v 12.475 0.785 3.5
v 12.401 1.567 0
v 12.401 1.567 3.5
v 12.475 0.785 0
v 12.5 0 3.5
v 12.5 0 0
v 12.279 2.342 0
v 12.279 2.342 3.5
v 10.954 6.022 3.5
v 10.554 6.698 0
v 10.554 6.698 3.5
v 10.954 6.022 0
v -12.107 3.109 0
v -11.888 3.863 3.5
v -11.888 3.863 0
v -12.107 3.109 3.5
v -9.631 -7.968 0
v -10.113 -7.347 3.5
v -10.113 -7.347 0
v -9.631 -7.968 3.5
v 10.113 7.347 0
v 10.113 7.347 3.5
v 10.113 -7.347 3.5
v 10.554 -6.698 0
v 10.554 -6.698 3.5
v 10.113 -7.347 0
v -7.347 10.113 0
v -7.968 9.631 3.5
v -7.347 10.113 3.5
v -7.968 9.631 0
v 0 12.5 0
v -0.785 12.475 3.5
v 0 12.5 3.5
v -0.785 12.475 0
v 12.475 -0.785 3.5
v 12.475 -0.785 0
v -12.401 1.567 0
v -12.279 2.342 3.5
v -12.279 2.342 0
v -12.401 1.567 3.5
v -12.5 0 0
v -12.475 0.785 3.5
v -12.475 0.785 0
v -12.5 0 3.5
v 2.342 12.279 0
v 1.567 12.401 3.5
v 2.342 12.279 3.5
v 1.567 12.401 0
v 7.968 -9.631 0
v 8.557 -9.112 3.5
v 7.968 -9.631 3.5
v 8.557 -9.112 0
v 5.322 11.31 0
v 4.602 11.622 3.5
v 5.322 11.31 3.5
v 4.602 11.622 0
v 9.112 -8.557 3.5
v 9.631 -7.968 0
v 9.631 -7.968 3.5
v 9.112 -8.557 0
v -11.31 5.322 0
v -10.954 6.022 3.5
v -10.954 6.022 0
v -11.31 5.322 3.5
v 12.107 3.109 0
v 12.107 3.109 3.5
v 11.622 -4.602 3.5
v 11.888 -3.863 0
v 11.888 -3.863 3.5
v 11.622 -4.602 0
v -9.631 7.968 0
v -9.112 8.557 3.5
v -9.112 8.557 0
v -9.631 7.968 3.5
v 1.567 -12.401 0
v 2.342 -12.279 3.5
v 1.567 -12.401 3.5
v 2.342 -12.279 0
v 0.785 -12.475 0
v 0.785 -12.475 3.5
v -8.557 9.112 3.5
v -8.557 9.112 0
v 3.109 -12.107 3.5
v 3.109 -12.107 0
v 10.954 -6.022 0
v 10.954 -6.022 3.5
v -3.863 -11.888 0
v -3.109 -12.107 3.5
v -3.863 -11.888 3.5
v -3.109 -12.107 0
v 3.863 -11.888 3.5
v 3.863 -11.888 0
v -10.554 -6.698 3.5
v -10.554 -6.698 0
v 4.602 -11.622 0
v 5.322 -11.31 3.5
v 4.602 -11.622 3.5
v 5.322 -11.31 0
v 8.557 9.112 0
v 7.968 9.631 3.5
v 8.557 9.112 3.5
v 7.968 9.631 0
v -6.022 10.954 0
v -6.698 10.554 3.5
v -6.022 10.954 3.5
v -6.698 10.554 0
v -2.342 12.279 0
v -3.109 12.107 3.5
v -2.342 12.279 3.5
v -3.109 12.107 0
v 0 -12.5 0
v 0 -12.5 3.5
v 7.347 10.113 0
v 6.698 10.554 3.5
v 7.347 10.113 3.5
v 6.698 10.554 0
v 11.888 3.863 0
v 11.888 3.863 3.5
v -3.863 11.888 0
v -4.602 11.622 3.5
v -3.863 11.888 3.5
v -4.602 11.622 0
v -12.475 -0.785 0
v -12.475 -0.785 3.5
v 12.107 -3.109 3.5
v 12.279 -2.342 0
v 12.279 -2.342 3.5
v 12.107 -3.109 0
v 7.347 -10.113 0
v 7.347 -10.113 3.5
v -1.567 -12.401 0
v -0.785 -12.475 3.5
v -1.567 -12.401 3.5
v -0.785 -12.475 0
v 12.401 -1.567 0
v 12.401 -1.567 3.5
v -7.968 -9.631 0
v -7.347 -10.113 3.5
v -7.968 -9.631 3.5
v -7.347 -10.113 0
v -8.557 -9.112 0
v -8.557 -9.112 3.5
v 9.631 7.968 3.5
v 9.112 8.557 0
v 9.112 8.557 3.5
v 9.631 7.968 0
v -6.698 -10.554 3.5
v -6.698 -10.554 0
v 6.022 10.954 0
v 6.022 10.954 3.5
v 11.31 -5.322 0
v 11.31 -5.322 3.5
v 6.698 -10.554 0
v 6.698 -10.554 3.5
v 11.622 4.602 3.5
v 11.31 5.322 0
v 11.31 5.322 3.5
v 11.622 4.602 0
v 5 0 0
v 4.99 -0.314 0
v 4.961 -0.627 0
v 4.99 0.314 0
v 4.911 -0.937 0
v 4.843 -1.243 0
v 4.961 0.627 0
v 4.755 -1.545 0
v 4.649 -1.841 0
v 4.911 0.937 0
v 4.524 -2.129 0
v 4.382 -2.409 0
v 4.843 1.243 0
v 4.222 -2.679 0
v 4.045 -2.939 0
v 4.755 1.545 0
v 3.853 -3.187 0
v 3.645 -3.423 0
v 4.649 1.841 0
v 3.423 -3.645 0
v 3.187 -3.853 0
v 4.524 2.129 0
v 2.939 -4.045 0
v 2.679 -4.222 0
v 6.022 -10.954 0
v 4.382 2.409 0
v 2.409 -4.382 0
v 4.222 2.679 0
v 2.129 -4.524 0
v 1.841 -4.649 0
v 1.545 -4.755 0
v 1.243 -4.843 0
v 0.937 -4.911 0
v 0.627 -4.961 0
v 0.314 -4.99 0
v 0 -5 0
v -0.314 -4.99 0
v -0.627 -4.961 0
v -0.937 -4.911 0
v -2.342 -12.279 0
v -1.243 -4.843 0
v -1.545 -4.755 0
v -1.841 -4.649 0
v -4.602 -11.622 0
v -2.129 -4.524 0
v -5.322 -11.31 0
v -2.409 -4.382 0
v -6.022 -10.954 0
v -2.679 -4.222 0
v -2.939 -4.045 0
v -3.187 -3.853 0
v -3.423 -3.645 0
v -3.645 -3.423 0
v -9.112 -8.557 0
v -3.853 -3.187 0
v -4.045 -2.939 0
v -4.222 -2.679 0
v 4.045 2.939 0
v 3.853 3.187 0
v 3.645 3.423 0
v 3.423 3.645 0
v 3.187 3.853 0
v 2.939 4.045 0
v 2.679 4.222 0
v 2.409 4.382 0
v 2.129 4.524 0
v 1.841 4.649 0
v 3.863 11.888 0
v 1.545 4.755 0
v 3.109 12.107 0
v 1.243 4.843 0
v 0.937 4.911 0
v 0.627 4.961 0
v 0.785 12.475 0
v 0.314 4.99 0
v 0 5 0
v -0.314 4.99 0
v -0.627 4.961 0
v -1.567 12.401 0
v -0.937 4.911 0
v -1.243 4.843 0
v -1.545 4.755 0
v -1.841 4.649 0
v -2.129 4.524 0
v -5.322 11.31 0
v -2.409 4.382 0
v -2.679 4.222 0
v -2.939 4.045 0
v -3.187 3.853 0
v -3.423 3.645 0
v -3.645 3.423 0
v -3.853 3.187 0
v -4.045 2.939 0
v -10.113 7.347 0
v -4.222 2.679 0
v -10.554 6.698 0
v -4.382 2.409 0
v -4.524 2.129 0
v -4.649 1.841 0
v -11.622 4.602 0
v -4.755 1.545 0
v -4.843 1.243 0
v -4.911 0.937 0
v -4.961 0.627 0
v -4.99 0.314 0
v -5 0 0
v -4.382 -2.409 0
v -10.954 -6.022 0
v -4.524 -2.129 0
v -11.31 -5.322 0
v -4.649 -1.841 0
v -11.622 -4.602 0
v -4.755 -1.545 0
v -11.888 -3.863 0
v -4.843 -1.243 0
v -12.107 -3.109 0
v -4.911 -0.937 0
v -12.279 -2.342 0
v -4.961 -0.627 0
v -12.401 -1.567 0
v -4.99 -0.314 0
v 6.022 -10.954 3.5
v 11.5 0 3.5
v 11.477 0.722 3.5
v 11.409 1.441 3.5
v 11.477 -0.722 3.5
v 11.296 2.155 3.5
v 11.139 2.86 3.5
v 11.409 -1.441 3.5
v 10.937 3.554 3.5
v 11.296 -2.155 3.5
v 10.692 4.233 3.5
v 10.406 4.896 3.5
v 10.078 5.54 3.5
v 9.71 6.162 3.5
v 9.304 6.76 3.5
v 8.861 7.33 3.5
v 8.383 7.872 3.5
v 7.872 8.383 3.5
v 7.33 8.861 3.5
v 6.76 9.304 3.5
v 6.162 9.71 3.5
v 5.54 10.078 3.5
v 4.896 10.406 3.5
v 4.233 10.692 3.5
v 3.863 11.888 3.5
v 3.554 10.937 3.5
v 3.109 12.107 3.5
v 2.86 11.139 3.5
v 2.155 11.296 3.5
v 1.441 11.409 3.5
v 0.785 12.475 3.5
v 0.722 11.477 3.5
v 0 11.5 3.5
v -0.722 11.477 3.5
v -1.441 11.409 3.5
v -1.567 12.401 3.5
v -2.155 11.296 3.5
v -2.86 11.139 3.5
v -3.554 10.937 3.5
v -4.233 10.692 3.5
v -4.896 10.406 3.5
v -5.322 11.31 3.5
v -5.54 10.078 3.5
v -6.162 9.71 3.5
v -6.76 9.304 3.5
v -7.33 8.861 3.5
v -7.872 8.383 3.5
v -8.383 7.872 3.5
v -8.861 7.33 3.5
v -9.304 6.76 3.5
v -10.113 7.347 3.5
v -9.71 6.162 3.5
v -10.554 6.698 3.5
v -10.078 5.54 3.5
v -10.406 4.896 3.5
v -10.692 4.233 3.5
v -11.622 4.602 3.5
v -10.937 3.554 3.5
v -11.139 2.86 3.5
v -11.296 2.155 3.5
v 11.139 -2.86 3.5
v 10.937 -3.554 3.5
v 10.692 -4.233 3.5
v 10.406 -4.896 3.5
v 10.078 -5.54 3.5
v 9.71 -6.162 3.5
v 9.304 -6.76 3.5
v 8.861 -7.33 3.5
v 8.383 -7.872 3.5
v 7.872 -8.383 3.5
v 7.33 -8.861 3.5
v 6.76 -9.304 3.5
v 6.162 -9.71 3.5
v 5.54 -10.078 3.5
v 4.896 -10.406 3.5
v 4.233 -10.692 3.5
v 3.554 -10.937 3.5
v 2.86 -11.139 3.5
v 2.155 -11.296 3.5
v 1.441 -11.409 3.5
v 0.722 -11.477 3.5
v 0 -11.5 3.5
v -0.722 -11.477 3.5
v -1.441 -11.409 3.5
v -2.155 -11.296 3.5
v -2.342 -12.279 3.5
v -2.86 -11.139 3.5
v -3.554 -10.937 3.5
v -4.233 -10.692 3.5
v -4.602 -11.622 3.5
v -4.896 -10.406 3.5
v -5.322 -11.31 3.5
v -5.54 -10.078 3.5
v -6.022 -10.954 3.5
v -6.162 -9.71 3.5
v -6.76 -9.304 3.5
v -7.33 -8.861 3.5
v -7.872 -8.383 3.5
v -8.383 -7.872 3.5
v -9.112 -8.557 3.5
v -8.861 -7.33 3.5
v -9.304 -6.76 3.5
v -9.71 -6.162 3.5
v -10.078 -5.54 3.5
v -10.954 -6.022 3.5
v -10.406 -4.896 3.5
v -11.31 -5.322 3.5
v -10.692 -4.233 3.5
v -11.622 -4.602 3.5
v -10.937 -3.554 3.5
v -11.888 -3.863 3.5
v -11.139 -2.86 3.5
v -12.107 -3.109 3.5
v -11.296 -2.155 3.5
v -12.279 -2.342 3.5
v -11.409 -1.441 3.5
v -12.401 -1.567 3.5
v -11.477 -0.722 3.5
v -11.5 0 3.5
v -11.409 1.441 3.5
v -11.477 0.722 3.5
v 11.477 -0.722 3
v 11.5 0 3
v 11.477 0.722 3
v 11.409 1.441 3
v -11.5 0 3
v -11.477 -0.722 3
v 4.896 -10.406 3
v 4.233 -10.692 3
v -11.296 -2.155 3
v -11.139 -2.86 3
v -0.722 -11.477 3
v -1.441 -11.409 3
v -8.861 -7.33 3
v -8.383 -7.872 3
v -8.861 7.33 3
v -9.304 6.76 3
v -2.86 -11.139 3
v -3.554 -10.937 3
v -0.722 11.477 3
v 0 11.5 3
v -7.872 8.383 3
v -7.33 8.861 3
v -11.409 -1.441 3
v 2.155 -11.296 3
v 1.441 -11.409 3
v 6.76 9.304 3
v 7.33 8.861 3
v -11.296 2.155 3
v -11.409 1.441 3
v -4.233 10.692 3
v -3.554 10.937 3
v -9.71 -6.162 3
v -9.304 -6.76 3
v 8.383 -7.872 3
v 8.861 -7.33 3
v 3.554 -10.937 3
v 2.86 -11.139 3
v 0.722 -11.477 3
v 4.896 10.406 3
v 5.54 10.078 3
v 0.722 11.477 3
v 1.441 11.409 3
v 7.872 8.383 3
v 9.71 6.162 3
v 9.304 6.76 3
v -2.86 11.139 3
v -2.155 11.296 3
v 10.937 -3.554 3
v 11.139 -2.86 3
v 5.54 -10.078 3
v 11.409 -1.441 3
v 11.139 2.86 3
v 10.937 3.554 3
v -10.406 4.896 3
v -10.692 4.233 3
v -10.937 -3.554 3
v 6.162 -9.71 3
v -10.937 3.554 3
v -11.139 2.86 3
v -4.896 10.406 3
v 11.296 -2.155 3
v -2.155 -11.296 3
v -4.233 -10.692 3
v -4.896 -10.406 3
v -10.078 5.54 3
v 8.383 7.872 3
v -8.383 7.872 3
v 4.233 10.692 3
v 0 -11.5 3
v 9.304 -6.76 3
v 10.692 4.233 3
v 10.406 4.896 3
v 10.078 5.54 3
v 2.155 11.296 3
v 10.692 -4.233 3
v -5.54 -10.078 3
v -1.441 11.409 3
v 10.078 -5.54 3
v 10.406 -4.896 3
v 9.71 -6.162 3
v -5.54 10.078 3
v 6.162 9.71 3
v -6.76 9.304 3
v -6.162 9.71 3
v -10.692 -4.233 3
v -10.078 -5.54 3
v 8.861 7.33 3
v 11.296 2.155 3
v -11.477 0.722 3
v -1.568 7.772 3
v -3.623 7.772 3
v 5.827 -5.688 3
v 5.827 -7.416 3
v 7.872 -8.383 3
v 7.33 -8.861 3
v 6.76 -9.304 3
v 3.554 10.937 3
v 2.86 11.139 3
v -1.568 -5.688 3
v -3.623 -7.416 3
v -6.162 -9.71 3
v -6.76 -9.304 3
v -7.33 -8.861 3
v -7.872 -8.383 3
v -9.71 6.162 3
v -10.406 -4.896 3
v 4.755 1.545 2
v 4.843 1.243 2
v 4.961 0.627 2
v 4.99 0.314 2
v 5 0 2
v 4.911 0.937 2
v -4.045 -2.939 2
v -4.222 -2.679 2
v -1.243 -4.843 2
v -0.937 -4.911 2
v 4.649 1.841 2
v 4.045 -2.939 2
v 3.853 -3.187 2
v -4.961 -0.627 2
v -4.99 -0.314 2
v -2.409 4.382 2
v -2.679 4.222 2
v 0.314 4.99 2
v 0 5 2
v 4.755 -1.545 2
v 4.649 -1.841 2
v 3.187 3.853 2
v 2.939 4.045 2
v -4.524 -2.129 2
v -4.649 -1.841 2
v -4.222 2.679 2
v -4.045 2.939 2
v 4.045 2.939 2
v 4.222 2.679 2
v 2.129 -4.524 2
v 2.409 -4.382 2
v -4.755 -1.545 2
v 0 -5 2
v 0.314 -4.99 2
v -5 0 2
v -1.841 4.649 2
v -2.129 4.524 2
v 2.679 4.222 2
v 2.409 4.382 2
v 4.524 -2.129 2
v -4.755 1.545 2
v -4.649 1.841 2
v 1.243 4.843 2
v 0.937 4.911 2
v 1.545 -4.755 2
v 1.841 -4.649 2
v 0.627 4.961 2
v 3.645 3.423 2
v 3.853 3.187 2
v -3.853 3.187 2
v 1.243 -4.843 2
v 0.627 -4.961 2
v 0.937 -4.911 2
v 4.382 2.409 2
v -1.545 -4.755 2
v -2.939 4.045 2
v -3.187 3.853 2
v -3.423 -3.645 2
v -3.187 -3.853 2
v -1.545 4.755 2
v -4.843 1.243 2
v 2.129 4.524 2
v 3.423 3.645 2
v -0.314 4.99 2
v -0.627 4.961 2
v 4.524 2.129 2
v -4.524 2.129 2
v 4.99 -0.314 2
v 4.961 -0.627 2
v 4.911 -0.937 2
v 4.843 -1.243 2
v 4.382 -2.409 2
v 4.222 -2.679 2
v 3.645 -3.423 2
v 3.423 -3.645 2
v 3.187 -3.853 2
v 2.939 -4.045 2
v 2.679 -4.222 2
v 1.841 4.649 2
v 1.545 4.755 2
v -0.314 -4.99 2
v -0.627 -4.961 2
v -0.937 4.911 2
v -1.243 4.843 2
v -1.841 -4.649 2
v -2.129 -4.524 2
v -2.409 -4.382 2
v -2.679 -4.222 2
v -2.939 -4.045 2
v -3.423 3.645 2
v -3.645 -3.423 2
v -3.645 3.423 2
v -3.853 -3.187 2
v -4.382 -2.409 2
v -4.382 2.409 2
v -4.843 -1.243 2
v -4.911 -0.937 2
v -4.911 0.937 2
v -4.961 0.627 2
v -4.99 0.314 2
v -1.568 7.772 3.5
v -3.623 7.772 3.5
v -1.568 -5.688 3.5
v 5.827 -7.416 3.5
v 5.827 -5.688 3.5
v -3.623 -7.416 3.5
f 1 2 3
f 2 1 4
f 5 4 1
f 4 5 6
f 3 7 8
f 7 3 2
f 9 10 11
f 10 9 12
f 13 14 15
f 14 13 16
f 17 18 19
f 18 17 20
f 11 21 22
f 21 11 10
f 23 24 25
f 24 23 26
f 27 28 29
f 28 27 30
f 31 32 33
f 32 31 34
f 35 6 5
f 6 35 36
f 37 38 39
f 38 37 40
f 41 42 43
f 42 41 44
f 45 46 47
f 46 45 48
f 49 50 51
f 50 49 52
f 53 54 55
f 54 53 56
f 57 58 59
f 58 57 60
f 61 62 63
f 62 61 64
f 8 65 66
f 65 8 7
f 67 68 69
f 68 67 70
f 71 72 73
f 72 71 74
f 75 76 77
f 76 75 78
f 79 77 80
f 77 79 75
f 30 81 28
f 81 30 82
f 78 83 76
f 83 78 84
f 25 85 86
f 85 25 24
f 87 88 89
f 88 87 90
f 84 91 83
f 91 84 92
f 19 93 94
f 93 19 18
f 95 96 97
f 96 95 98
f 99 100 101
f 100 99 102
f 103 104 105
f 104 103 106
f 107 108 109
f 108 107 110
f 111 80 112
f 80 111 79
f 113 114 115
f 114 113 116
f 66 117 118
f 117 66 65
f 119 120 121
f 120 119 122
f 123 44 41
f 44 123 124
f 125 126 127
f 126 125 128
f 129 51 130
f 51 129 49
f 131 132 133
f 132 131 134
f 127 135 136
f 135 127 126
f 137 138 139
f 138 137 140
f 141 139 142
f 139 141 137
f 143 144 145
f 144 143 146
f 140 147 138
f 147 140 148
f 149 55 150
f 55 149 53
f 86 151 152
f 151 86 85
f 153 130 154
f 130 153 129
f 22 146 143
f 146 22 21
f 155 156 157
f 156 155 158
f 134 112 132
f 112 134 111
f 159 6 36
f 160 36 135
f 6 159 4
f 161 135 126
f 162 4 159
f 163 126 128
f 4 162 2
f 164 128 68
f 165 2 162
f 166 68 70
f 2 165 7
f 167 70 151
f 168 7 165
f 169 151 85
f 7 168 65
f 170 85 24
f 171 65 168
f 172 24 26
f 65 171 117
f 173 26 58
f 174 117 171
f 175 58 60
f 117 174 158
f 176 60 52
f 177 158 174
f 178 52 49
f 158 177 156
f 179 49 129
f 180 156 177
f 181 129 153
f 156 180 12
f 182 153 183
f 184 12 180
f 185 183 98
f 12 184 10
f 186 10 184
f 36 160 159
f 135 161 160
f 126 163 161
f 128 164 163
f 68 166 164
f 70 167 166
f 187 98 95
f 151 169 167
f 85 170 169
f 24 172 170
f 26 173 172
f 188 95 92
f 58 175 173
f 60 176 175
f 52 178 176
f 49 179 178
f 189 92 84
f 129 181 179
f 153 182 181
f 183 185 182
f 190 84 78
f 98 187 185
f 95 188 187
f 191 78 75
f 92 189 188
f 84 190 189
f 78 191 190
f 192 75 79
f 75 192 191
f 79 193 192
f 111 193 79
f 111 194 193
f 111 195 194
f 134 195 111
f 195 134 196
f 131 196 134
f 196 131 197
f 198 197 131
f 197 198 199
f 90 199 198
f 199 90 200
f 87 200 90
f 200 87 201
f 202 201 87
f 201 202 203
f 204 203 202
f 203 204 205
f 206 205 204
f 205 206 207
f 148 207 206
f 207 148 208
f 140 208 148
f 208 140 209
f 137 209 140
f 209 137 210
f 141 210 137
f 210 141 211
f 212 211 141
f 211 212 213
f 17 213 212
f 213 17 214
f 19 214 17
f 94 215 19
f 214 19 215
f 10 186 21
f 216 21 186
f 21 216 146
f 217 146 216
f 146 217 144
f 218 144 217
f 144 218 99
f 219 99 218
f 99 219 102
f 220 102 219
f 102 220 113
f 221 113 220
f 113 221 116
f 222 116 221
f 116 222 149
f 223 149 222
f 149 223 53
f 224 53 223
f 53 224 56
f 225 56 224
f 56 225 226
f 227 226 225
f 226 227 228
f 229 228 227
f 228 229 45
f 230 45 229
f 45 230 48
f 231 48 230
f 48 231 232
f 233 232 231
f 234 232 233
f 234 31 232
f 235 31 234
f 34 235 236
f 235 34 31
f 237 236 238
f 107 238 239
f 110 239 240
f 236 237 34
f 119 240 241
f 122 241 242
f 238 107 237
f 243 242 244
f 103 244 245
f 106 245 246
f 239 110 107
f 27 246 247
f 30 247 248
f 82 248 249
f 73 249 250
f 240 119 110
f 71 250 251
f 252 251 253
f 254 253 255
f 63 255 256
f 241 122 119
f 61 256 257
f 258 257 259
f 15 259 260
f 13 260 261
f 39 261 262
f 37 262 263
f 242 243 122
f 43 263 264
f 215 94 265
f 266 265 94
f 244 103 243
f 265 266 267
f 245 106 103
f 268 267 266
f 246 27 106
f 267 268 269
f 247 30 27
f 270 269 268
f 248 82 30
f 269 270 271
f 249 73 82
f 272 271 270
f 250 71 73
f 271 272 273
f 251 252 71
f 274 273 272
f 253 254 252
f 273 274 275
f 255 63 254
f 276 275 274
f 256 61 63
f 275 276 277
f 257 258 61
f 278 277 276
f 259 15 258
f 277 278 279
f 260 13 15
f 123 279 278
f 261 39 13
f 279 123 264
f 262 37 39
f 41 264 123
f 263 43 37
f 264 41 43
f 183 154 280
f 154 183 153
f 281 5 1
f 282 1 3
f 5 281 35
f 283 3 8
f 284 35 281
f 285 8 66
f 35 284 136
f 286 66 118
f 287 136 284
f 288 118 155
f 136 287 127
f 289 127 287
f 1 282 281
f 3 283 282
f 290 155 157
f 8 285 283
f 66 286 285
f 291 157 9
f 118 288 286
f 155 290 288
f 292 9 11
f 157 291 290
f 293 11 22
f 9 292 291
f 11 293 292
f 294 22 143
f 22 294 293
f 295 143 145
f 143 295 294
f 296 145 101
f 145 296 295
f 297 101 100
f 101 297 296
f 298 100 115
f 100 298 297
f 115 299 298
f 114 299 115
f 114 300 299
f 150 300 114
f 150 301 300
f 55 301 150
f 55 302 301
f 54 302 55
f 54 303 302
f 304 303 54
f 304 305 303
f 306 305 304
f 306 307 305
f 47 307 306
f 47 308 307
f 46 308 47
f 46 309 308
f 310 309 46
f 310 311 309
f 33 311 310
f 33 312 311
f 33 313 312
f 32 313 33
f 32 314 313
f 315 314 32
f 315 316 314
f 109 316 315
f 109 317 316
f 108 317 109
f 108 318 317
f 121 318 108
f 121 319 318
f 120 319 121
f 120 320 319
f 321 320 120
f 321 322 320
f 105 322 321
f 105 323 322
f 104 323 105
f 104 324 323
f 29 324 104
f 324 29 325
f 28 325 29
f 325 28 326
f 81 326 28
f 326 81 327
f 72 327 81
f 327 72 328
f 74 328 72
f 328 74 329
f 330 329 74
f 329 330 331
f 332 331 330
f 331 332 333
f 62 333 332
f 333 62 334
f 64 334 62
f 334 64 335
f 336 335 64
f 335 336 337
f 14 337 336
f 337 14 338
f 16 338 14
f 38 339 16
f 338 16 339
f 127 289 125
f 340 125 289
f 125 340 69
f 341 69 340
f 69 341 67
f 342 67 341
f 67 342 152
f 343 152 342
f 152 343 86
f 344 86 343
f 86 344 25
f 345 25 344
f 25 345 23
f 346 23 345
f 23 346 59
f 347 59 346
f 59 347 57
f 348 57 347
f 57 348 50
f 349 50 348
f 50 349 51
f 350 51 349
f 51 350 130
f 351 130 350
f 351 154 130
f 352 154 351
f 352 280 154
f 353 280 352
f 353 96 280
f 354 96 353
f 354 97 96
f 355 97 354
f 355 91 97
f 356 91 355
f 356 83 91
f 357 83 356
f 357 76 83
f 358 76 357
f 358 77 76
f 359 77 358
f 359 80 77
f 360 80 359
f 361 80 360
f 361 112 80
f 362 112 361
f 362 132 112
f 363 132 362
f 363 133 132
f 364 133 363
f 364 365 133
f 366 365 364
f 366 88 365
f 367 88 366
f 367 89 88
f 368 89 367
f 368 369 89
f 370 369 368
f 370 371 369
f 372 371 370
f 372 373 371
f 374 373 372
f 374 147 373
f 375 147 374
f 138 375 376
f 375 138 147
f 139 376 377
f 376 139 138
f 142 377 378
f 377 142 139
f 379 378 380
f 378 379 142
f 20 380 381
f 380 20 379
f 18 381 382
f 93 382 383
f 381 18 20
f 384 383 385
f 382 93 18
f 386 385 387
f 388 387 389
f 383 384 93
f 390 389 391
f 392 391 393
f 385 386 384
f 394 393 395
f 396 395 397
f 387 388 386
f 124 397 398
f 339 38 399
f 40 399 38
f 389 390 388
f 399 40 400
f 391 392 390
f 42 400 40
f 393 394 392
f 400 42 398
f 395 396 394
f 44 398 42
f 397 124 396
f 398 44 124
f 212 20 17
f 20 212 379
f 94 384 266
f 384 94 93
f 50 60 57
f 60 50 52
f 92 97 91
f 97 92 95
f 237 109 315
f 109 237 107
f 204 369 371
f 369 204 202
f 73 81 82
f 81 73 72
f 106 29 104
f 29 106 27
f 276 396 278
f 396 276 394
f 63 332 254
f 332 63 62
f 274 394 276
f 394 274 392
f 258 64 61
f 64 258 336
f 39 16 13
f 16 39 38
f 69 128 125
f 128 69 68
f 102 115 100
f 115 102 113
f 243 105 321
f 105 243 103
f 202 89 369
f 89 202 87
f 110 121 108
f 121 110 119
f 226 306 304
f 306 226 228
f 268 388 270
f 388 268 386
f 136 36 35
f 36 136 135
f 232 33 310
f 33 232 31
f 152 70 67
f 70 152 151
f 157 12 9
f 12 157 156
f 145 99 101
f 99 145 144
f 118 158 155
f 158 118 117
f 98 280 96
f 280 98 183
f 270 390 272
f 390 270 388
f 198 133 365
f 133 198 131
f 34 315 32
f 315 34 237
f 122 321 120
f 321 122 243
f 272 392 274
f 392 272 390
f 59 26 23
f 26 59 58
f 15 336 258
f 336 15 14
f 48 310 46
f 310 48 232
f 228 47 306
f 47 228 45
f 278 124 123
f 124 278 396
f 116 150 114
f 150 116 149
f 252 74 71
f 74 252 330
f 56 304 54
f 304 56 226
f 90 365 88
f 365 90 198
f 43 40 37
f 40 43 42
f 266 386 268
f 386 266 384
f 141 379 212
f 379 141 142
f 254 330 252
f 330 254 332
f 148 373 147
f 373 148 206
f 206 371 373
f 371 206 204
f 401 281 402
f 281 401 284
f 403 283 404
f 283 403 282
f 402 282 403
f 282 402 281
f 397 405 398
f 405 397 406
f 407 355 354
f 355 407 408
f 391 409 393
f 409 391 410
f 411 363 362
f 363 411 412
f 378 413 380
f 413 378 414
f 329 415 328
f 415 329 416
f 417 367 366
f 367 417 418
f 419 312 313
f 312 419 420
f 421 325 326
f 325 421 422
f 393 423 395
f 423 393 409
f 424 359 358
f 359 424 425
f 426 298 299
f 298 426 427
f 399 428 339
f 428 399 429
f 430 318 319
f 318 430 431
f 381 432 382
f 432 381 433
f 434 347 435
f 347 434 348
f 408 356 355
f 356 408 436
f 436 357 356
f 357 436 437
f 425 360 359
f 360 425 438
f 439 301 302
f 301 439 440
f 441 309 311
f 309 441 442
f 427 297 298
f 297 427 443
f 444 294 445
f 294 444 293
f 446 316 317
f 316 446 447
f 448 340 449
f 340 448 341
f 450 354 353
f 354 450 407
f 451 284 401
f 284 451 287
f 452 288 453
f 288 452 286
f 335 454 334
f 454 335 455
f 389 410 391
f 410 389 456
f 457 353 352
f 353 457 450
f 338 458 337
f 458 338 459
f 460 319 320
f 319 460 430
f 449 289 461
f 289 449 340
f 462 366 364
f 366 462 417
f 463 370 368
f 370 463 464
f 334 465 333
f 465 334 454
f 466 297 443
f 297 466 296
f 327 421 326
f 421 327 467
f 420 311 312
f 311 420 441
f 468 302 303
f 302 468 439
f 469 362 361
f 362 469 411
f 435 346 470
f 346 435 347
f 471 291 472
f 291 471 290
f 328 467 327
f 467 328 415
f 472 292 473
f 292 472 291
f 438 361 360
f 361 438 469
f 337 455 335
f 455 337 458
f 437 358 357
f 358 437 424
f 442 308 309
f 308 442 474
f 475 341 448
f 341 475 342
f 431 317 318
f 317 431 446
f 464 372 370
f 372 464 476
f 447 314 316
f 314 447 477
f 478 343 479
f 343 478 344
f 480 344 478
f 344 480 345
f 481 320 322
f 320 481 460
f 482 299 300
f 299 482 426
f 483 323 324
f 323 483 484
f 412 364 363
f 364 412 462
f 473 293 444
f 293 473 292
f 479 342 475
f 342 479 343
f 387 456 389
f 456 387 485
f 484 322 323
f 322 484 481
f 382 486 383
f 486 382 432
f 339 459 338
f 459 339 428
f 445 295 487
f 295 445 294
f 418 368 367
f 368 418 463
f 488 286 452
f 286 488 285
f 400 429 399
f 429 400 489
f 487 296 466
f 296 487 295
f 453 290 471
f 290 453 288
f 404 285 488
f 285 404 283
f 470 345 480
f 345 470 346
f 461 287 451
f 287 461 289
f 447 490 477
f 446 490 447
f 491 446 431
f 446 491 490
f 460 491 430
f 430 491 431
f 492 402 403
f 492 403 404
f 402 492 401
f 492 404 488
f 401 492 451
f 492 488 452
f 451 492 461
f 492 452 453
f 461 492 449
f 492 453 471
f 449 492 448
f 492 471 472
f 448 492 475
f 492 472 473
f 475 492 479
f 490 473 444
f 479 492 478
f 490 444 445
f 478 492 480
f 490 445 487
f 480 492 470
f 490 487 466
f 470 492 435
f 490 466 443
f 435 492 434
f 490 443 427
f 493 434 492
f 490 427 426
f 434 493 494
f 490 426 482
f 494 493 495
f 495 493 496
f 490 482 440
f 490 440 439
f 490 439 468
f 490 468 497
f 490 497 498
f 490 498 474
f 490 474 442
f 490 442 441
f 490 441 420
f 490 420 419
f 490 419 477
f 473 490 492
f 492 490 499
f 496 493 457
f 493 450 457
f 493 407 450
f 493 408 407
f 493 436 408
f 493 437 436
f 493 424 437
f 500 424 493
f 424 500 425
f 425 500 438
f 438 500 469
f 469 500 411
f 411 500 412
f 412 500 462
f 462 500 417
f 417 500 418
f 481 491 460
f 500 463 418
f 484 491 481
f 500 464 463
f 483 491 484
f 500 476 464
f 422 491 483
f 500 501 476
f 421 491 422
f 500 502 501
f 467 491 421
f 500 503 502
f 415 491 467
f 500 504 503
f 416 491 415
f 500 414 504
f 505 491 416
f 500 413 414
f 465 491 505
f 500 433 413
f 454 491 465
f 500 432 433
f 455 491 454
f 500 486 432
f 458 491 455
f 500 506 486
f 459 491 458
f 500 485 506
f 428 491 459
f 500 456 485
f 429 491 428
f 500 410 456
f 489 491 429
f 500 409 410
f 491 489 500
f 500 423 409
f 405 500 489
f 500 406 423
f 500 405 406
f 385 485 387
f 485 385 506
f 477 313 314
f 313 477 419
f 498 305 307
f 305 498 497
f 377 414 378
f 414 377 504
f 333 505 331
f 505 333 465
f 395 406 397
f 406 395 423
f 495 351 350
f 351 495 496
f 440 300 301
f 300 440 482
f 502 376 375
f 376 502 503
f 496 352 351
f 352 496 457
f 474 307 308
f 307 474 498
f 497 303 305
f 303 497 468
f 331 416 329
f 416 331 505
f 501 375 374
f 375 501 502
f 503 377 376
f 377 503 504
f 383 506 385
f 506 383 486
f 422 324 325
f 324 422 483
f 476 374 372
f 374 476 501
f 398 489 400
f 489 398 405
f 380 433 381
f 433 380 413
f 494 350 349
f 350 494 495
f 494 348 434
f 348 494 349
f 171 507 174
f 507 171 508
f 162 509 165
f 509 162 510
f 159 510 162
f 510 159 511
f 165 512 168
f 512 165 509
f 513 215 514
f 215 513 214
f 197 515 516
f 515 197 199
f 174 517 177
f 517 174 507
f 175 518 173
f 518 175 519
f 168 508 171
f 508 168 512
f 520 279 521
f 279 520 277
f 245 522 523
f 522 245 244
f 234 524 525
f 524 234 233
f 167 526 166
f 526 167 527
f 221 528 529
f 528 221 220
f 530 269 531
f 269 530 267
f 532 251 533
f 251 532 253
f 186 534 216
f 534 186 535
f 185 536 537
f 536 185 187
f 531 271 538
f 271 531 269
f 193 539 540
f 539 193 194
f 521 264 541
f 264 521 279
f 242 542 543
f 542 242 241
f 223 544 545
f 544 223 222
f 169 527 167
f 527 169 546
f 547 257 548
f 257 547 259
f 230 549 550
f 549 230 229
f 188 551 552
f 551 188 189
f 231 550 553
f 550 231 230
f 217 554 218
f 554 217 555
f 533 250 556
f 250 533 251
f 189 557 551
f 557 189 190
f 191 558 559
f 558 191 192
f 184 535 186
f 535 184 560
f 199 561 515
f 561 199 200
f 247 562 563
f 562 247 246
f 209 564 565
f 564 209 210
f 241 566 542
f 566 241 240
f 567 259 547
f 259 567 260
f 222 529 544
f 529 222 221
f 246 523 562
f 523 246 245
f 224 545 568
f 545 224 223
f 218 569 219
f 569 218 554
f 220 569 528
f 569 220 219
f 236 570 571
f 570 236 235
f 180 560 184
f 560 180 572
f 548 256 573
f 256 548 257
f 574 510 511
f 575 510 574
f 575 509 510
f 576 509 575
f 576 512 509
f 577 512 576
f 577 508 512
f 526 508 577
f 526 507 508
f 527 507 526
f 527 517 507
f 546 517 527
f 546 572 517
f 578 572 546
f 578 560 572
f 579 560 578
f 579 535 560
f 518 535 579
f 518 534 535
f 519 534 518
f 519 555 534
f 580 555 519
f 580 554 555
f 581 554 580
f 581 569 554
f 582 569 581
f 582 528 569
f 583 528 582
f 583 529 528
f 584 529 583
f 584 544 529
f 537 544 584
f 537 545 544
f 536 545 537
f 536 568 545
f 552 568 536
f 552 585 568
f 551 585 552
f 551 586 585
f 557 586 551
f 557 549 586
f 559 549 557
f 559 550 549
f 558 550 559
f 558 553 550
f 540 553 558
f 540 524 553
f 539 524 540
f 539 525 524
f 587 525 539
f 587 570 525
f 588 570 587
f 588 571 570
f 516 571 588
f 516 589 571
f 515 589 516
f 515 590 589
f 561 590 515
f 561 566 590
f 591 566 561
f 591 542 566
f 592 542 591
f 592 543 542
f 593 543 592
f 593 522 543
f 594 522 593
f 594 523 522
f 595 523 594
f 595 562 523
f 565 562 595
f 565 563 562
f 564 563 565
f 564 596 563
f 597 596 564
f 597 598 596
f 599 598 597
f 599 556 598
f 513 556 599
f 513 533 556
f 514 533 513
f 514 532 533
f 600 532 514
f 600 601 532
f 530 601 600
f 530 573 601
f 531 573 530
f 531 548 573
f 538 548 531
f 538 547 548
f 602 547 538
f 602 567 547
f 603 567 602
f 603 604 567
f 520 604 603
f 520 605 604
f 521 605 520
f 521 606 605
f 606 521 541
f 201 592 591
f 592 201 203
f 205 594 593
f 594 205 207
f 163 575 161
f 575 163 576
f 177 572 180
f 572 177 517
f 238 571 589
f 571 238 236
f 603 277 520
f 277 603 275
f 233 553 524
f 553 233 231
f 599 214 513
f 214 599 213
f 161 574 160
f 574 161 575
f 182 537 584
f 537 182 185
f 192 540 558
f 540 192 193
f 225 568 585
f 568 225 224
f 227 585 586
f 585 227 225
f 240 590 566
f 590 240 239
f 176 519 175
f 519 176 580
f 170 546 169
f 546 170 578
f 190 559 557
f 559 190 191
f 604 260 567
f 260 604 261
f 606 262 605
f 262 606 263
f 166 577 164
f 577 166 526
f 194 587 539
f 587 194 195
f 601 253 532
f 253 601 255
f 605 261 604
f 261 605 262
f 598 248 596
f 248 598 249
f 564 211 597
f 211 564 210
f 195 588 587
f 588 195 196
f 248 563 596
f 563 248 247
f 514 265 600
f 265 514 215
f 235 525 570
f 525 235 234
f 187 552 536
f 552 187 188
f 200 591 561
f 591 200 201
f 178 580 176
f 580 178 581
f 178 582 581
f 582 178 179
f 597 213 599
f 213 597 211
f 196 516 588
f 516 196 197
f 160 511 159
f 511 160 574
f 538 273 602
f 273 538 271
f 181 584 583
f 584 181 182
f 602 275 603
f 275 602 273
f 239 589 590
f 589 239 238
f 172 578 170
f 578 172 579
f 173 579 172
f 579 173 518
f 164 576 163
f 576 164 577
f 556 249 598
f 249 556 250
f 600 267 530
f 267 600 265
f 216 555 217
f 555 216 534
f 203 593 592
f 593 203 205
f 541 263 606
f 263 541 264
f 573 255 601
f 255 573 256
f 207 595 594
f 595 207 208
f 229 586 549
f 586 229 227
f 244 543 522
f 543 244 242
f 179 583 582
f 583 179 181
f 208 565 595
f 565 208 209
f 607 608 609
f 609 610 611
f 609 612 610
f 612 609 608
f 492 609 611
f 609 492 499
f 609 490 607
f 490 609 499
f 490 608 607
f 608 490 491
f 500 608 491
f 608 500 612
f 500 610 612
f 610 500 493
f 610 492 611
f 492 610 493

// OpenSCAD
MAGNET_DIA = 10;
MAGNET_THICKNESS = 2;

MARKER_DIA = 25;
MARKER_THICKNESS = MAGNET_THICKNESS + 1.5;

SYMBOL_THICKNESS = 0.5;
SYMBOL_INLAY_DIA = MARKER_DIA - 2;
SYMBOL_SIZE = 0.6 * MARKER_DIA;
SYMBOL_FONT = "URW Bookman:style=Demi";
SYMBOL = "L";

$fn = 100;

union() {
  difference() {
    cylinder(d = MARKER_DIA, h = MARKER_THICKNESS);
    translate([0, 0, MARKER_THICKNESS - SYMBOL_THICKNESS])
    cylinder(d = SYMBOL_INLAY_DIA, h = SYMBOL_THICKNESS);
    cylinder(d = MAGNET_DIA, h = MAGNET_THICKNESS);
  }

  translate([0, 0, MARKER_THICKNESS - SYMBOL_THICKNESS])
  linear_extrude(SYMBOL_THICKNESS)
  text(SYMBOL, font = SYMBOL_FONT, size = SYMBOL_SIZE, valign = "center", halign = "center");
}
